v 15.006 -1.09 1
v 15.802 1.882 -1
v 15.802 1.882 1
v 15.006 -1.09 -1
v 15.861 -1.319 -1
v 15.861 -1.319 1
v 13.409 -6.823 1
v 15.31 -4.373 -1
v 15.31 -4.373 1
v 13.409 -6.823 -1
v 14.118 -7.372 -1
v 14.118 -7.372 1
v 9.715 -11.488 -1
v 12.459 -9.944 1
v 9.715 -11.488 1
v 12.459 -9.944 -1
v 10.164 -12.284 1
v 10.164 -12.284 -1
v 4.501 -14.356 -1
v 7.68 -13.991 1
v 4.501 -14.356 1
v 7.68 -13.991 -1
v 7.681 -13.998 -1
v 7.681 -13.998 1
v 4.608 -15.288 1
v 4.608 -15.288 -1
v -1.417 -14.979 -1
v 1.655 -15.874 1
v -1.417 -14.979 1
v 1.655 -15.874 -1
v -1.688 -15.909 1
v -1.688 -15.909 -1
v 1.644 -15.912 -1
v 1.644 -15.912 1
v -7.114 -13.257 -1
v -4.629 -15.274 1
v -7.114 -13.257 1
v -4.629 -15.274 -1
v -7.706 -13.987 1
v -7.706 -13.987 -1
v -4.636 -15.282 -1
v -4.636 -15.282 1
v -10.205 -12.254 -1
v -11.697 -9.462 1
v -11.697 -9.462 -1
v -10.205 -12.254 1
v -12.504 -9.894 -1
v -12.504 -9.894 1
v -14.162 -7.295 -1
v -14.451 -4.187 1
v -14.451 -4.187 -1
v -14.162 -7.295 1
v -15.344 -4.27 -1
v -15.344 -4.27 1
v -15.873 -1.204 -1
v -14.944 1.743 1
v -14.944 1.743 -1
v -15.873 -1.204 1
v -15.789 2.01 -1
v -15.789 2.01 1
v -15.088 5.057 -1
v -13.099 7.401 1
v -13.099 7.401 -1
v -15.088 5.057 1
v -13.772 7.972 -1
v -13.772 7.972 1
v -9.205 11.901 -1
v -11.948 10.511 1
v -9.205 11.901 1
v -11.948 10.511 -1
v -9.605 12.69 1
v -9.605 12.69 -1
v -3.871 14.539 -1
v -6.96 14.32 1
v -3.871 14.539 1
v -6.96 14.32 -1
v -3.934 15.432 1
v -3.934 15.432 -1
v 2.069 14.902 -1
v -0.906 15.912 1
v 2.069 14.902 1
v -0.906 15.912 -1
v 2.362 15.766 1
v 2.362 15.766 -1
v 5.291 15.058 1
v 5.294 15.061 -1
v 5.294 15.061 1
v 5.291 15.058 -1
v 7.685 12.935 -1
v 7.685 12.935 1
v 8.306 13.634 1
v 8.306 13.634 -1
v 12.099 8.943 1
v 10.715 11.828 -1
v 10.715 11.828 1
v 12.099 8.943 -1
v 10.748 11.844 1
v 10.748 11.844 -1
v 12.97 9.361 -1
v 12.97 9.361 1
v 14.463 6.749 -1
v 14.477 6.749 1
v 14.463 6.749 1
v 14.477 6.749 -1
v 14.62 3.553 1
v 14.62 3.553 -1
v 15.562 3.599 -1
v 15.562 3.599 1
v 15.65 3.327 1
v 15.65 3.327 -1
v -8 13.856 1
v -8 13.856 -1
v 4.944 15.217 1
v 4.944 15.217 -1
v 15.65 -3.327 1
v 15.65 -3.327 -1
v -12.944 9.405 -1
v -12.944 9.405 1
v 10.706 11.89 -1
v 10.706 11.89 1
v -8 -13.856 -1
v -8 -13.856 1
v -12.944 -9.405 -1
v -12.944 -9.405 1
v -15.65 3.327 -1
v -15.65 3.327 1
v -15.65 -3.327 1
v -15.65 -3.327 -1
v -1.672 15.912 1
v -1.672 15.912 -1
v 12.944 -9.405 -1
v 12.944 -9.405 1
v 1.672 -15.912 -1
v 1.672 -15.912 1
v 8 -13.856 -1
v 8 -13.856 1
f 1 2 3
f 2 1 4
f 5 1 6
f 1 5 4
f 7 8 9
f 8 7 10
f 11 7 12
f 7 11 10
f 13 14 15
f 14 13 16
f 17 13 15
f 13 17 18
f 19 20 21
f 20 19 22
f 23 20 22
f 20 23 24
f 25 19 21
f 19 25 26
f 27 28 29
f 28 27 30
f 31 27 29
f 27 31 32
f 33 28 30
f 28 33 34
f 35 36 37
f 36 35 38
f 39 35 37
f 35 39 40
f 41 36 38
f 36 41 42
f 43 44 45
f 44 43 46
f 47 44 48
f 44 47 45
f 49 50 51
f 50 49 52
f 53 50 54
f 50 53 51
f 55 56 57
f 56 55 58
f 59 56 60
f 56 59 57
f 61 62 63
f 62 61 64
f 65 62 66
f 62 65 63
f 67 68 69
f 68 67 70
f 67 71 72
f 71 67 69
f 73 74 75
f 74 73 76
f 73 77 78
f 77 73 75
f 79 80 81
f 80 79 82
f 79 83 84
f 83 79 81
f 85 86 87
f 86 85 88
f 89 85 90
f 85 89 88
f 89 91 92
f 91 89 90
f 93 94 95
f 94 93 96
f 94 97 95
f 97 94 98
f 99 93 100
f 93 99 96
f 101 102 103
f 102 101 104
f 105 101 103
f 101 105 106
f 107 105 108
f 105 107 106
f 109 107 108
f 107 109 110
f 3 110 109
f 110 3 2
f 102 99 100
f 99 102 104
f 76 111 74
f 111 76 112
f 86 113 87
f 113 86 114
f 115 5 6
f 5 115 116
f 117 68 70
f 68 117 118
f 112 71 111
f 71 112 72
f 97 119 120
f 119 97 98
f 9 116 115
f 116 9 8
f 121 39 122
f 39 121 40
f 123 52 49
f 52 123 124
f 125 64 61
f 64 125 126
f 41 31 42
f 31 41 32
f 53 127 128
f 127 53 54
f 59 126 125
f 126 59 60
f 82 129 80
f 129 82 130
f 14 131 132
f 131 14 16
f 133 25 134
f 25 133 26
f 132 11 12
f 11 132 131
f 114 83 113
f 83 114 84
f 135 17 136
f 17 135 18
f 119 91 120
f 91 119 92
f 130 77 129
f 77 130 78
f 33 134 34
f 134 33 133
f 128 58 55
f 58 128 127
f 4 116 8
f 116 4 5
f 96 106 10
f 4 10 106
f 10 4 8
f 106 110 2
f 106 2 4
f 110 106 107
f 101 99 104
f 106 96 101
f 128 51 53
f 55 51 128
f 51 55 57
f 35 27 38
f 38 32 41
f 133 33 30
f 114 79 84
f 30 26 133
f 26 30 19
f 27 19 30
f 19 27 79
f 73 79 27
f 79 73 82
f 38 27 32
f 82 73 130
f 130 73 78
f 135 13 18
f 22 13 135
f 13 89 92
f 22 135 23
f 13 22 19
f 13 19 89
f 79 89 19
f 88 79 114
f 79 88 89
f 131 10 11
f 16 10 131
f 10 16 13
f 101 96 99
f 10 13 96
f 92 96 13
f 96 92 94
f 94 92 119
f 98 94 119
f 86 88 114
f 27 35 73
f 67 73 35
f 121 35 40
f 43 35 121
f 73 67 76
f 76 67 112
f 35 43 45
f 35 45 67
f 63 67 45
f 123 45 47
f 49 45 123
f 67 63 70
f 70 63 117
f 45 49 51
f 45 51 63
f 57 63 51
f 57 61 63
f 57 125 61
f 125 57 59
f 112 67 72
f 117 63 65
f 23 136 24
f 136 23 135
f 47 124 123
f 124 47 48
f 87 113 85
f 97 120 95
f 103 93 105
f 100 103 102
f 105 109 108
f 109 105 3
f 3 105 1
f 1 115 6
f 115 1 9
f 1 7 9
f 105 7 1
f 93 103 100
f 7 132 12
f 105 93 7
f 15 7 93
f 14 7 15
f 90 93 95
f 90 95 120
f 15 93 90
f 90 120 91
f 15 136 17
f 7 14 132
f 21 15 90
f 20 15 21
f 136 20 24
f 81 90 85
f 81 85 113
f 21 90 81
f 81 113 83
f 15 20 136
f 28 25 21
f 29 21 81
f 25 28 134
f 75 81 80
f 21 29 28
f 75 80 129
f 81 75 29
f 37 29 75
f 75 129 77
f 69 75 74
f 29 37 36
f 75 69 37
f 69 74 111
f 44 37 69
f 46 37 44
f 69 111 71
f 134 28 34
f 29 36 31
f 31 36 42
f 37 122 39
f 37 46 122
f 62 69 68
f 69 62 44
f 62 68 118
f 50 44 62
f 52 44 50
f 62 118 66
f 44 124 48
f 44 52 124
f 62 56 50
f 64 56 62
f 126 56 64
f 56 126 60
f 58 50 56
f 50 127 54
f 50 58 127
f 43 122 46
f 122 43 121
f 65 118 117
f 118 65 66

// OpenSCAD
size=32; //block=32 //item=8


difference(){
cylinder(h=size*0.125*0.5,d=size*1,center=true);

union(){
count=16;
for(i=[0:1:count-1]){
rotate([365/count*i,90,0]){
translate([0,0,size*0.535]){
rotate([15,0,0]){
cube([size*0.1,size*0.1,size*0.11],center=true);
};	//rotate
};	//translate
};	//rotate
};	//for
};	//union

};	//difference
